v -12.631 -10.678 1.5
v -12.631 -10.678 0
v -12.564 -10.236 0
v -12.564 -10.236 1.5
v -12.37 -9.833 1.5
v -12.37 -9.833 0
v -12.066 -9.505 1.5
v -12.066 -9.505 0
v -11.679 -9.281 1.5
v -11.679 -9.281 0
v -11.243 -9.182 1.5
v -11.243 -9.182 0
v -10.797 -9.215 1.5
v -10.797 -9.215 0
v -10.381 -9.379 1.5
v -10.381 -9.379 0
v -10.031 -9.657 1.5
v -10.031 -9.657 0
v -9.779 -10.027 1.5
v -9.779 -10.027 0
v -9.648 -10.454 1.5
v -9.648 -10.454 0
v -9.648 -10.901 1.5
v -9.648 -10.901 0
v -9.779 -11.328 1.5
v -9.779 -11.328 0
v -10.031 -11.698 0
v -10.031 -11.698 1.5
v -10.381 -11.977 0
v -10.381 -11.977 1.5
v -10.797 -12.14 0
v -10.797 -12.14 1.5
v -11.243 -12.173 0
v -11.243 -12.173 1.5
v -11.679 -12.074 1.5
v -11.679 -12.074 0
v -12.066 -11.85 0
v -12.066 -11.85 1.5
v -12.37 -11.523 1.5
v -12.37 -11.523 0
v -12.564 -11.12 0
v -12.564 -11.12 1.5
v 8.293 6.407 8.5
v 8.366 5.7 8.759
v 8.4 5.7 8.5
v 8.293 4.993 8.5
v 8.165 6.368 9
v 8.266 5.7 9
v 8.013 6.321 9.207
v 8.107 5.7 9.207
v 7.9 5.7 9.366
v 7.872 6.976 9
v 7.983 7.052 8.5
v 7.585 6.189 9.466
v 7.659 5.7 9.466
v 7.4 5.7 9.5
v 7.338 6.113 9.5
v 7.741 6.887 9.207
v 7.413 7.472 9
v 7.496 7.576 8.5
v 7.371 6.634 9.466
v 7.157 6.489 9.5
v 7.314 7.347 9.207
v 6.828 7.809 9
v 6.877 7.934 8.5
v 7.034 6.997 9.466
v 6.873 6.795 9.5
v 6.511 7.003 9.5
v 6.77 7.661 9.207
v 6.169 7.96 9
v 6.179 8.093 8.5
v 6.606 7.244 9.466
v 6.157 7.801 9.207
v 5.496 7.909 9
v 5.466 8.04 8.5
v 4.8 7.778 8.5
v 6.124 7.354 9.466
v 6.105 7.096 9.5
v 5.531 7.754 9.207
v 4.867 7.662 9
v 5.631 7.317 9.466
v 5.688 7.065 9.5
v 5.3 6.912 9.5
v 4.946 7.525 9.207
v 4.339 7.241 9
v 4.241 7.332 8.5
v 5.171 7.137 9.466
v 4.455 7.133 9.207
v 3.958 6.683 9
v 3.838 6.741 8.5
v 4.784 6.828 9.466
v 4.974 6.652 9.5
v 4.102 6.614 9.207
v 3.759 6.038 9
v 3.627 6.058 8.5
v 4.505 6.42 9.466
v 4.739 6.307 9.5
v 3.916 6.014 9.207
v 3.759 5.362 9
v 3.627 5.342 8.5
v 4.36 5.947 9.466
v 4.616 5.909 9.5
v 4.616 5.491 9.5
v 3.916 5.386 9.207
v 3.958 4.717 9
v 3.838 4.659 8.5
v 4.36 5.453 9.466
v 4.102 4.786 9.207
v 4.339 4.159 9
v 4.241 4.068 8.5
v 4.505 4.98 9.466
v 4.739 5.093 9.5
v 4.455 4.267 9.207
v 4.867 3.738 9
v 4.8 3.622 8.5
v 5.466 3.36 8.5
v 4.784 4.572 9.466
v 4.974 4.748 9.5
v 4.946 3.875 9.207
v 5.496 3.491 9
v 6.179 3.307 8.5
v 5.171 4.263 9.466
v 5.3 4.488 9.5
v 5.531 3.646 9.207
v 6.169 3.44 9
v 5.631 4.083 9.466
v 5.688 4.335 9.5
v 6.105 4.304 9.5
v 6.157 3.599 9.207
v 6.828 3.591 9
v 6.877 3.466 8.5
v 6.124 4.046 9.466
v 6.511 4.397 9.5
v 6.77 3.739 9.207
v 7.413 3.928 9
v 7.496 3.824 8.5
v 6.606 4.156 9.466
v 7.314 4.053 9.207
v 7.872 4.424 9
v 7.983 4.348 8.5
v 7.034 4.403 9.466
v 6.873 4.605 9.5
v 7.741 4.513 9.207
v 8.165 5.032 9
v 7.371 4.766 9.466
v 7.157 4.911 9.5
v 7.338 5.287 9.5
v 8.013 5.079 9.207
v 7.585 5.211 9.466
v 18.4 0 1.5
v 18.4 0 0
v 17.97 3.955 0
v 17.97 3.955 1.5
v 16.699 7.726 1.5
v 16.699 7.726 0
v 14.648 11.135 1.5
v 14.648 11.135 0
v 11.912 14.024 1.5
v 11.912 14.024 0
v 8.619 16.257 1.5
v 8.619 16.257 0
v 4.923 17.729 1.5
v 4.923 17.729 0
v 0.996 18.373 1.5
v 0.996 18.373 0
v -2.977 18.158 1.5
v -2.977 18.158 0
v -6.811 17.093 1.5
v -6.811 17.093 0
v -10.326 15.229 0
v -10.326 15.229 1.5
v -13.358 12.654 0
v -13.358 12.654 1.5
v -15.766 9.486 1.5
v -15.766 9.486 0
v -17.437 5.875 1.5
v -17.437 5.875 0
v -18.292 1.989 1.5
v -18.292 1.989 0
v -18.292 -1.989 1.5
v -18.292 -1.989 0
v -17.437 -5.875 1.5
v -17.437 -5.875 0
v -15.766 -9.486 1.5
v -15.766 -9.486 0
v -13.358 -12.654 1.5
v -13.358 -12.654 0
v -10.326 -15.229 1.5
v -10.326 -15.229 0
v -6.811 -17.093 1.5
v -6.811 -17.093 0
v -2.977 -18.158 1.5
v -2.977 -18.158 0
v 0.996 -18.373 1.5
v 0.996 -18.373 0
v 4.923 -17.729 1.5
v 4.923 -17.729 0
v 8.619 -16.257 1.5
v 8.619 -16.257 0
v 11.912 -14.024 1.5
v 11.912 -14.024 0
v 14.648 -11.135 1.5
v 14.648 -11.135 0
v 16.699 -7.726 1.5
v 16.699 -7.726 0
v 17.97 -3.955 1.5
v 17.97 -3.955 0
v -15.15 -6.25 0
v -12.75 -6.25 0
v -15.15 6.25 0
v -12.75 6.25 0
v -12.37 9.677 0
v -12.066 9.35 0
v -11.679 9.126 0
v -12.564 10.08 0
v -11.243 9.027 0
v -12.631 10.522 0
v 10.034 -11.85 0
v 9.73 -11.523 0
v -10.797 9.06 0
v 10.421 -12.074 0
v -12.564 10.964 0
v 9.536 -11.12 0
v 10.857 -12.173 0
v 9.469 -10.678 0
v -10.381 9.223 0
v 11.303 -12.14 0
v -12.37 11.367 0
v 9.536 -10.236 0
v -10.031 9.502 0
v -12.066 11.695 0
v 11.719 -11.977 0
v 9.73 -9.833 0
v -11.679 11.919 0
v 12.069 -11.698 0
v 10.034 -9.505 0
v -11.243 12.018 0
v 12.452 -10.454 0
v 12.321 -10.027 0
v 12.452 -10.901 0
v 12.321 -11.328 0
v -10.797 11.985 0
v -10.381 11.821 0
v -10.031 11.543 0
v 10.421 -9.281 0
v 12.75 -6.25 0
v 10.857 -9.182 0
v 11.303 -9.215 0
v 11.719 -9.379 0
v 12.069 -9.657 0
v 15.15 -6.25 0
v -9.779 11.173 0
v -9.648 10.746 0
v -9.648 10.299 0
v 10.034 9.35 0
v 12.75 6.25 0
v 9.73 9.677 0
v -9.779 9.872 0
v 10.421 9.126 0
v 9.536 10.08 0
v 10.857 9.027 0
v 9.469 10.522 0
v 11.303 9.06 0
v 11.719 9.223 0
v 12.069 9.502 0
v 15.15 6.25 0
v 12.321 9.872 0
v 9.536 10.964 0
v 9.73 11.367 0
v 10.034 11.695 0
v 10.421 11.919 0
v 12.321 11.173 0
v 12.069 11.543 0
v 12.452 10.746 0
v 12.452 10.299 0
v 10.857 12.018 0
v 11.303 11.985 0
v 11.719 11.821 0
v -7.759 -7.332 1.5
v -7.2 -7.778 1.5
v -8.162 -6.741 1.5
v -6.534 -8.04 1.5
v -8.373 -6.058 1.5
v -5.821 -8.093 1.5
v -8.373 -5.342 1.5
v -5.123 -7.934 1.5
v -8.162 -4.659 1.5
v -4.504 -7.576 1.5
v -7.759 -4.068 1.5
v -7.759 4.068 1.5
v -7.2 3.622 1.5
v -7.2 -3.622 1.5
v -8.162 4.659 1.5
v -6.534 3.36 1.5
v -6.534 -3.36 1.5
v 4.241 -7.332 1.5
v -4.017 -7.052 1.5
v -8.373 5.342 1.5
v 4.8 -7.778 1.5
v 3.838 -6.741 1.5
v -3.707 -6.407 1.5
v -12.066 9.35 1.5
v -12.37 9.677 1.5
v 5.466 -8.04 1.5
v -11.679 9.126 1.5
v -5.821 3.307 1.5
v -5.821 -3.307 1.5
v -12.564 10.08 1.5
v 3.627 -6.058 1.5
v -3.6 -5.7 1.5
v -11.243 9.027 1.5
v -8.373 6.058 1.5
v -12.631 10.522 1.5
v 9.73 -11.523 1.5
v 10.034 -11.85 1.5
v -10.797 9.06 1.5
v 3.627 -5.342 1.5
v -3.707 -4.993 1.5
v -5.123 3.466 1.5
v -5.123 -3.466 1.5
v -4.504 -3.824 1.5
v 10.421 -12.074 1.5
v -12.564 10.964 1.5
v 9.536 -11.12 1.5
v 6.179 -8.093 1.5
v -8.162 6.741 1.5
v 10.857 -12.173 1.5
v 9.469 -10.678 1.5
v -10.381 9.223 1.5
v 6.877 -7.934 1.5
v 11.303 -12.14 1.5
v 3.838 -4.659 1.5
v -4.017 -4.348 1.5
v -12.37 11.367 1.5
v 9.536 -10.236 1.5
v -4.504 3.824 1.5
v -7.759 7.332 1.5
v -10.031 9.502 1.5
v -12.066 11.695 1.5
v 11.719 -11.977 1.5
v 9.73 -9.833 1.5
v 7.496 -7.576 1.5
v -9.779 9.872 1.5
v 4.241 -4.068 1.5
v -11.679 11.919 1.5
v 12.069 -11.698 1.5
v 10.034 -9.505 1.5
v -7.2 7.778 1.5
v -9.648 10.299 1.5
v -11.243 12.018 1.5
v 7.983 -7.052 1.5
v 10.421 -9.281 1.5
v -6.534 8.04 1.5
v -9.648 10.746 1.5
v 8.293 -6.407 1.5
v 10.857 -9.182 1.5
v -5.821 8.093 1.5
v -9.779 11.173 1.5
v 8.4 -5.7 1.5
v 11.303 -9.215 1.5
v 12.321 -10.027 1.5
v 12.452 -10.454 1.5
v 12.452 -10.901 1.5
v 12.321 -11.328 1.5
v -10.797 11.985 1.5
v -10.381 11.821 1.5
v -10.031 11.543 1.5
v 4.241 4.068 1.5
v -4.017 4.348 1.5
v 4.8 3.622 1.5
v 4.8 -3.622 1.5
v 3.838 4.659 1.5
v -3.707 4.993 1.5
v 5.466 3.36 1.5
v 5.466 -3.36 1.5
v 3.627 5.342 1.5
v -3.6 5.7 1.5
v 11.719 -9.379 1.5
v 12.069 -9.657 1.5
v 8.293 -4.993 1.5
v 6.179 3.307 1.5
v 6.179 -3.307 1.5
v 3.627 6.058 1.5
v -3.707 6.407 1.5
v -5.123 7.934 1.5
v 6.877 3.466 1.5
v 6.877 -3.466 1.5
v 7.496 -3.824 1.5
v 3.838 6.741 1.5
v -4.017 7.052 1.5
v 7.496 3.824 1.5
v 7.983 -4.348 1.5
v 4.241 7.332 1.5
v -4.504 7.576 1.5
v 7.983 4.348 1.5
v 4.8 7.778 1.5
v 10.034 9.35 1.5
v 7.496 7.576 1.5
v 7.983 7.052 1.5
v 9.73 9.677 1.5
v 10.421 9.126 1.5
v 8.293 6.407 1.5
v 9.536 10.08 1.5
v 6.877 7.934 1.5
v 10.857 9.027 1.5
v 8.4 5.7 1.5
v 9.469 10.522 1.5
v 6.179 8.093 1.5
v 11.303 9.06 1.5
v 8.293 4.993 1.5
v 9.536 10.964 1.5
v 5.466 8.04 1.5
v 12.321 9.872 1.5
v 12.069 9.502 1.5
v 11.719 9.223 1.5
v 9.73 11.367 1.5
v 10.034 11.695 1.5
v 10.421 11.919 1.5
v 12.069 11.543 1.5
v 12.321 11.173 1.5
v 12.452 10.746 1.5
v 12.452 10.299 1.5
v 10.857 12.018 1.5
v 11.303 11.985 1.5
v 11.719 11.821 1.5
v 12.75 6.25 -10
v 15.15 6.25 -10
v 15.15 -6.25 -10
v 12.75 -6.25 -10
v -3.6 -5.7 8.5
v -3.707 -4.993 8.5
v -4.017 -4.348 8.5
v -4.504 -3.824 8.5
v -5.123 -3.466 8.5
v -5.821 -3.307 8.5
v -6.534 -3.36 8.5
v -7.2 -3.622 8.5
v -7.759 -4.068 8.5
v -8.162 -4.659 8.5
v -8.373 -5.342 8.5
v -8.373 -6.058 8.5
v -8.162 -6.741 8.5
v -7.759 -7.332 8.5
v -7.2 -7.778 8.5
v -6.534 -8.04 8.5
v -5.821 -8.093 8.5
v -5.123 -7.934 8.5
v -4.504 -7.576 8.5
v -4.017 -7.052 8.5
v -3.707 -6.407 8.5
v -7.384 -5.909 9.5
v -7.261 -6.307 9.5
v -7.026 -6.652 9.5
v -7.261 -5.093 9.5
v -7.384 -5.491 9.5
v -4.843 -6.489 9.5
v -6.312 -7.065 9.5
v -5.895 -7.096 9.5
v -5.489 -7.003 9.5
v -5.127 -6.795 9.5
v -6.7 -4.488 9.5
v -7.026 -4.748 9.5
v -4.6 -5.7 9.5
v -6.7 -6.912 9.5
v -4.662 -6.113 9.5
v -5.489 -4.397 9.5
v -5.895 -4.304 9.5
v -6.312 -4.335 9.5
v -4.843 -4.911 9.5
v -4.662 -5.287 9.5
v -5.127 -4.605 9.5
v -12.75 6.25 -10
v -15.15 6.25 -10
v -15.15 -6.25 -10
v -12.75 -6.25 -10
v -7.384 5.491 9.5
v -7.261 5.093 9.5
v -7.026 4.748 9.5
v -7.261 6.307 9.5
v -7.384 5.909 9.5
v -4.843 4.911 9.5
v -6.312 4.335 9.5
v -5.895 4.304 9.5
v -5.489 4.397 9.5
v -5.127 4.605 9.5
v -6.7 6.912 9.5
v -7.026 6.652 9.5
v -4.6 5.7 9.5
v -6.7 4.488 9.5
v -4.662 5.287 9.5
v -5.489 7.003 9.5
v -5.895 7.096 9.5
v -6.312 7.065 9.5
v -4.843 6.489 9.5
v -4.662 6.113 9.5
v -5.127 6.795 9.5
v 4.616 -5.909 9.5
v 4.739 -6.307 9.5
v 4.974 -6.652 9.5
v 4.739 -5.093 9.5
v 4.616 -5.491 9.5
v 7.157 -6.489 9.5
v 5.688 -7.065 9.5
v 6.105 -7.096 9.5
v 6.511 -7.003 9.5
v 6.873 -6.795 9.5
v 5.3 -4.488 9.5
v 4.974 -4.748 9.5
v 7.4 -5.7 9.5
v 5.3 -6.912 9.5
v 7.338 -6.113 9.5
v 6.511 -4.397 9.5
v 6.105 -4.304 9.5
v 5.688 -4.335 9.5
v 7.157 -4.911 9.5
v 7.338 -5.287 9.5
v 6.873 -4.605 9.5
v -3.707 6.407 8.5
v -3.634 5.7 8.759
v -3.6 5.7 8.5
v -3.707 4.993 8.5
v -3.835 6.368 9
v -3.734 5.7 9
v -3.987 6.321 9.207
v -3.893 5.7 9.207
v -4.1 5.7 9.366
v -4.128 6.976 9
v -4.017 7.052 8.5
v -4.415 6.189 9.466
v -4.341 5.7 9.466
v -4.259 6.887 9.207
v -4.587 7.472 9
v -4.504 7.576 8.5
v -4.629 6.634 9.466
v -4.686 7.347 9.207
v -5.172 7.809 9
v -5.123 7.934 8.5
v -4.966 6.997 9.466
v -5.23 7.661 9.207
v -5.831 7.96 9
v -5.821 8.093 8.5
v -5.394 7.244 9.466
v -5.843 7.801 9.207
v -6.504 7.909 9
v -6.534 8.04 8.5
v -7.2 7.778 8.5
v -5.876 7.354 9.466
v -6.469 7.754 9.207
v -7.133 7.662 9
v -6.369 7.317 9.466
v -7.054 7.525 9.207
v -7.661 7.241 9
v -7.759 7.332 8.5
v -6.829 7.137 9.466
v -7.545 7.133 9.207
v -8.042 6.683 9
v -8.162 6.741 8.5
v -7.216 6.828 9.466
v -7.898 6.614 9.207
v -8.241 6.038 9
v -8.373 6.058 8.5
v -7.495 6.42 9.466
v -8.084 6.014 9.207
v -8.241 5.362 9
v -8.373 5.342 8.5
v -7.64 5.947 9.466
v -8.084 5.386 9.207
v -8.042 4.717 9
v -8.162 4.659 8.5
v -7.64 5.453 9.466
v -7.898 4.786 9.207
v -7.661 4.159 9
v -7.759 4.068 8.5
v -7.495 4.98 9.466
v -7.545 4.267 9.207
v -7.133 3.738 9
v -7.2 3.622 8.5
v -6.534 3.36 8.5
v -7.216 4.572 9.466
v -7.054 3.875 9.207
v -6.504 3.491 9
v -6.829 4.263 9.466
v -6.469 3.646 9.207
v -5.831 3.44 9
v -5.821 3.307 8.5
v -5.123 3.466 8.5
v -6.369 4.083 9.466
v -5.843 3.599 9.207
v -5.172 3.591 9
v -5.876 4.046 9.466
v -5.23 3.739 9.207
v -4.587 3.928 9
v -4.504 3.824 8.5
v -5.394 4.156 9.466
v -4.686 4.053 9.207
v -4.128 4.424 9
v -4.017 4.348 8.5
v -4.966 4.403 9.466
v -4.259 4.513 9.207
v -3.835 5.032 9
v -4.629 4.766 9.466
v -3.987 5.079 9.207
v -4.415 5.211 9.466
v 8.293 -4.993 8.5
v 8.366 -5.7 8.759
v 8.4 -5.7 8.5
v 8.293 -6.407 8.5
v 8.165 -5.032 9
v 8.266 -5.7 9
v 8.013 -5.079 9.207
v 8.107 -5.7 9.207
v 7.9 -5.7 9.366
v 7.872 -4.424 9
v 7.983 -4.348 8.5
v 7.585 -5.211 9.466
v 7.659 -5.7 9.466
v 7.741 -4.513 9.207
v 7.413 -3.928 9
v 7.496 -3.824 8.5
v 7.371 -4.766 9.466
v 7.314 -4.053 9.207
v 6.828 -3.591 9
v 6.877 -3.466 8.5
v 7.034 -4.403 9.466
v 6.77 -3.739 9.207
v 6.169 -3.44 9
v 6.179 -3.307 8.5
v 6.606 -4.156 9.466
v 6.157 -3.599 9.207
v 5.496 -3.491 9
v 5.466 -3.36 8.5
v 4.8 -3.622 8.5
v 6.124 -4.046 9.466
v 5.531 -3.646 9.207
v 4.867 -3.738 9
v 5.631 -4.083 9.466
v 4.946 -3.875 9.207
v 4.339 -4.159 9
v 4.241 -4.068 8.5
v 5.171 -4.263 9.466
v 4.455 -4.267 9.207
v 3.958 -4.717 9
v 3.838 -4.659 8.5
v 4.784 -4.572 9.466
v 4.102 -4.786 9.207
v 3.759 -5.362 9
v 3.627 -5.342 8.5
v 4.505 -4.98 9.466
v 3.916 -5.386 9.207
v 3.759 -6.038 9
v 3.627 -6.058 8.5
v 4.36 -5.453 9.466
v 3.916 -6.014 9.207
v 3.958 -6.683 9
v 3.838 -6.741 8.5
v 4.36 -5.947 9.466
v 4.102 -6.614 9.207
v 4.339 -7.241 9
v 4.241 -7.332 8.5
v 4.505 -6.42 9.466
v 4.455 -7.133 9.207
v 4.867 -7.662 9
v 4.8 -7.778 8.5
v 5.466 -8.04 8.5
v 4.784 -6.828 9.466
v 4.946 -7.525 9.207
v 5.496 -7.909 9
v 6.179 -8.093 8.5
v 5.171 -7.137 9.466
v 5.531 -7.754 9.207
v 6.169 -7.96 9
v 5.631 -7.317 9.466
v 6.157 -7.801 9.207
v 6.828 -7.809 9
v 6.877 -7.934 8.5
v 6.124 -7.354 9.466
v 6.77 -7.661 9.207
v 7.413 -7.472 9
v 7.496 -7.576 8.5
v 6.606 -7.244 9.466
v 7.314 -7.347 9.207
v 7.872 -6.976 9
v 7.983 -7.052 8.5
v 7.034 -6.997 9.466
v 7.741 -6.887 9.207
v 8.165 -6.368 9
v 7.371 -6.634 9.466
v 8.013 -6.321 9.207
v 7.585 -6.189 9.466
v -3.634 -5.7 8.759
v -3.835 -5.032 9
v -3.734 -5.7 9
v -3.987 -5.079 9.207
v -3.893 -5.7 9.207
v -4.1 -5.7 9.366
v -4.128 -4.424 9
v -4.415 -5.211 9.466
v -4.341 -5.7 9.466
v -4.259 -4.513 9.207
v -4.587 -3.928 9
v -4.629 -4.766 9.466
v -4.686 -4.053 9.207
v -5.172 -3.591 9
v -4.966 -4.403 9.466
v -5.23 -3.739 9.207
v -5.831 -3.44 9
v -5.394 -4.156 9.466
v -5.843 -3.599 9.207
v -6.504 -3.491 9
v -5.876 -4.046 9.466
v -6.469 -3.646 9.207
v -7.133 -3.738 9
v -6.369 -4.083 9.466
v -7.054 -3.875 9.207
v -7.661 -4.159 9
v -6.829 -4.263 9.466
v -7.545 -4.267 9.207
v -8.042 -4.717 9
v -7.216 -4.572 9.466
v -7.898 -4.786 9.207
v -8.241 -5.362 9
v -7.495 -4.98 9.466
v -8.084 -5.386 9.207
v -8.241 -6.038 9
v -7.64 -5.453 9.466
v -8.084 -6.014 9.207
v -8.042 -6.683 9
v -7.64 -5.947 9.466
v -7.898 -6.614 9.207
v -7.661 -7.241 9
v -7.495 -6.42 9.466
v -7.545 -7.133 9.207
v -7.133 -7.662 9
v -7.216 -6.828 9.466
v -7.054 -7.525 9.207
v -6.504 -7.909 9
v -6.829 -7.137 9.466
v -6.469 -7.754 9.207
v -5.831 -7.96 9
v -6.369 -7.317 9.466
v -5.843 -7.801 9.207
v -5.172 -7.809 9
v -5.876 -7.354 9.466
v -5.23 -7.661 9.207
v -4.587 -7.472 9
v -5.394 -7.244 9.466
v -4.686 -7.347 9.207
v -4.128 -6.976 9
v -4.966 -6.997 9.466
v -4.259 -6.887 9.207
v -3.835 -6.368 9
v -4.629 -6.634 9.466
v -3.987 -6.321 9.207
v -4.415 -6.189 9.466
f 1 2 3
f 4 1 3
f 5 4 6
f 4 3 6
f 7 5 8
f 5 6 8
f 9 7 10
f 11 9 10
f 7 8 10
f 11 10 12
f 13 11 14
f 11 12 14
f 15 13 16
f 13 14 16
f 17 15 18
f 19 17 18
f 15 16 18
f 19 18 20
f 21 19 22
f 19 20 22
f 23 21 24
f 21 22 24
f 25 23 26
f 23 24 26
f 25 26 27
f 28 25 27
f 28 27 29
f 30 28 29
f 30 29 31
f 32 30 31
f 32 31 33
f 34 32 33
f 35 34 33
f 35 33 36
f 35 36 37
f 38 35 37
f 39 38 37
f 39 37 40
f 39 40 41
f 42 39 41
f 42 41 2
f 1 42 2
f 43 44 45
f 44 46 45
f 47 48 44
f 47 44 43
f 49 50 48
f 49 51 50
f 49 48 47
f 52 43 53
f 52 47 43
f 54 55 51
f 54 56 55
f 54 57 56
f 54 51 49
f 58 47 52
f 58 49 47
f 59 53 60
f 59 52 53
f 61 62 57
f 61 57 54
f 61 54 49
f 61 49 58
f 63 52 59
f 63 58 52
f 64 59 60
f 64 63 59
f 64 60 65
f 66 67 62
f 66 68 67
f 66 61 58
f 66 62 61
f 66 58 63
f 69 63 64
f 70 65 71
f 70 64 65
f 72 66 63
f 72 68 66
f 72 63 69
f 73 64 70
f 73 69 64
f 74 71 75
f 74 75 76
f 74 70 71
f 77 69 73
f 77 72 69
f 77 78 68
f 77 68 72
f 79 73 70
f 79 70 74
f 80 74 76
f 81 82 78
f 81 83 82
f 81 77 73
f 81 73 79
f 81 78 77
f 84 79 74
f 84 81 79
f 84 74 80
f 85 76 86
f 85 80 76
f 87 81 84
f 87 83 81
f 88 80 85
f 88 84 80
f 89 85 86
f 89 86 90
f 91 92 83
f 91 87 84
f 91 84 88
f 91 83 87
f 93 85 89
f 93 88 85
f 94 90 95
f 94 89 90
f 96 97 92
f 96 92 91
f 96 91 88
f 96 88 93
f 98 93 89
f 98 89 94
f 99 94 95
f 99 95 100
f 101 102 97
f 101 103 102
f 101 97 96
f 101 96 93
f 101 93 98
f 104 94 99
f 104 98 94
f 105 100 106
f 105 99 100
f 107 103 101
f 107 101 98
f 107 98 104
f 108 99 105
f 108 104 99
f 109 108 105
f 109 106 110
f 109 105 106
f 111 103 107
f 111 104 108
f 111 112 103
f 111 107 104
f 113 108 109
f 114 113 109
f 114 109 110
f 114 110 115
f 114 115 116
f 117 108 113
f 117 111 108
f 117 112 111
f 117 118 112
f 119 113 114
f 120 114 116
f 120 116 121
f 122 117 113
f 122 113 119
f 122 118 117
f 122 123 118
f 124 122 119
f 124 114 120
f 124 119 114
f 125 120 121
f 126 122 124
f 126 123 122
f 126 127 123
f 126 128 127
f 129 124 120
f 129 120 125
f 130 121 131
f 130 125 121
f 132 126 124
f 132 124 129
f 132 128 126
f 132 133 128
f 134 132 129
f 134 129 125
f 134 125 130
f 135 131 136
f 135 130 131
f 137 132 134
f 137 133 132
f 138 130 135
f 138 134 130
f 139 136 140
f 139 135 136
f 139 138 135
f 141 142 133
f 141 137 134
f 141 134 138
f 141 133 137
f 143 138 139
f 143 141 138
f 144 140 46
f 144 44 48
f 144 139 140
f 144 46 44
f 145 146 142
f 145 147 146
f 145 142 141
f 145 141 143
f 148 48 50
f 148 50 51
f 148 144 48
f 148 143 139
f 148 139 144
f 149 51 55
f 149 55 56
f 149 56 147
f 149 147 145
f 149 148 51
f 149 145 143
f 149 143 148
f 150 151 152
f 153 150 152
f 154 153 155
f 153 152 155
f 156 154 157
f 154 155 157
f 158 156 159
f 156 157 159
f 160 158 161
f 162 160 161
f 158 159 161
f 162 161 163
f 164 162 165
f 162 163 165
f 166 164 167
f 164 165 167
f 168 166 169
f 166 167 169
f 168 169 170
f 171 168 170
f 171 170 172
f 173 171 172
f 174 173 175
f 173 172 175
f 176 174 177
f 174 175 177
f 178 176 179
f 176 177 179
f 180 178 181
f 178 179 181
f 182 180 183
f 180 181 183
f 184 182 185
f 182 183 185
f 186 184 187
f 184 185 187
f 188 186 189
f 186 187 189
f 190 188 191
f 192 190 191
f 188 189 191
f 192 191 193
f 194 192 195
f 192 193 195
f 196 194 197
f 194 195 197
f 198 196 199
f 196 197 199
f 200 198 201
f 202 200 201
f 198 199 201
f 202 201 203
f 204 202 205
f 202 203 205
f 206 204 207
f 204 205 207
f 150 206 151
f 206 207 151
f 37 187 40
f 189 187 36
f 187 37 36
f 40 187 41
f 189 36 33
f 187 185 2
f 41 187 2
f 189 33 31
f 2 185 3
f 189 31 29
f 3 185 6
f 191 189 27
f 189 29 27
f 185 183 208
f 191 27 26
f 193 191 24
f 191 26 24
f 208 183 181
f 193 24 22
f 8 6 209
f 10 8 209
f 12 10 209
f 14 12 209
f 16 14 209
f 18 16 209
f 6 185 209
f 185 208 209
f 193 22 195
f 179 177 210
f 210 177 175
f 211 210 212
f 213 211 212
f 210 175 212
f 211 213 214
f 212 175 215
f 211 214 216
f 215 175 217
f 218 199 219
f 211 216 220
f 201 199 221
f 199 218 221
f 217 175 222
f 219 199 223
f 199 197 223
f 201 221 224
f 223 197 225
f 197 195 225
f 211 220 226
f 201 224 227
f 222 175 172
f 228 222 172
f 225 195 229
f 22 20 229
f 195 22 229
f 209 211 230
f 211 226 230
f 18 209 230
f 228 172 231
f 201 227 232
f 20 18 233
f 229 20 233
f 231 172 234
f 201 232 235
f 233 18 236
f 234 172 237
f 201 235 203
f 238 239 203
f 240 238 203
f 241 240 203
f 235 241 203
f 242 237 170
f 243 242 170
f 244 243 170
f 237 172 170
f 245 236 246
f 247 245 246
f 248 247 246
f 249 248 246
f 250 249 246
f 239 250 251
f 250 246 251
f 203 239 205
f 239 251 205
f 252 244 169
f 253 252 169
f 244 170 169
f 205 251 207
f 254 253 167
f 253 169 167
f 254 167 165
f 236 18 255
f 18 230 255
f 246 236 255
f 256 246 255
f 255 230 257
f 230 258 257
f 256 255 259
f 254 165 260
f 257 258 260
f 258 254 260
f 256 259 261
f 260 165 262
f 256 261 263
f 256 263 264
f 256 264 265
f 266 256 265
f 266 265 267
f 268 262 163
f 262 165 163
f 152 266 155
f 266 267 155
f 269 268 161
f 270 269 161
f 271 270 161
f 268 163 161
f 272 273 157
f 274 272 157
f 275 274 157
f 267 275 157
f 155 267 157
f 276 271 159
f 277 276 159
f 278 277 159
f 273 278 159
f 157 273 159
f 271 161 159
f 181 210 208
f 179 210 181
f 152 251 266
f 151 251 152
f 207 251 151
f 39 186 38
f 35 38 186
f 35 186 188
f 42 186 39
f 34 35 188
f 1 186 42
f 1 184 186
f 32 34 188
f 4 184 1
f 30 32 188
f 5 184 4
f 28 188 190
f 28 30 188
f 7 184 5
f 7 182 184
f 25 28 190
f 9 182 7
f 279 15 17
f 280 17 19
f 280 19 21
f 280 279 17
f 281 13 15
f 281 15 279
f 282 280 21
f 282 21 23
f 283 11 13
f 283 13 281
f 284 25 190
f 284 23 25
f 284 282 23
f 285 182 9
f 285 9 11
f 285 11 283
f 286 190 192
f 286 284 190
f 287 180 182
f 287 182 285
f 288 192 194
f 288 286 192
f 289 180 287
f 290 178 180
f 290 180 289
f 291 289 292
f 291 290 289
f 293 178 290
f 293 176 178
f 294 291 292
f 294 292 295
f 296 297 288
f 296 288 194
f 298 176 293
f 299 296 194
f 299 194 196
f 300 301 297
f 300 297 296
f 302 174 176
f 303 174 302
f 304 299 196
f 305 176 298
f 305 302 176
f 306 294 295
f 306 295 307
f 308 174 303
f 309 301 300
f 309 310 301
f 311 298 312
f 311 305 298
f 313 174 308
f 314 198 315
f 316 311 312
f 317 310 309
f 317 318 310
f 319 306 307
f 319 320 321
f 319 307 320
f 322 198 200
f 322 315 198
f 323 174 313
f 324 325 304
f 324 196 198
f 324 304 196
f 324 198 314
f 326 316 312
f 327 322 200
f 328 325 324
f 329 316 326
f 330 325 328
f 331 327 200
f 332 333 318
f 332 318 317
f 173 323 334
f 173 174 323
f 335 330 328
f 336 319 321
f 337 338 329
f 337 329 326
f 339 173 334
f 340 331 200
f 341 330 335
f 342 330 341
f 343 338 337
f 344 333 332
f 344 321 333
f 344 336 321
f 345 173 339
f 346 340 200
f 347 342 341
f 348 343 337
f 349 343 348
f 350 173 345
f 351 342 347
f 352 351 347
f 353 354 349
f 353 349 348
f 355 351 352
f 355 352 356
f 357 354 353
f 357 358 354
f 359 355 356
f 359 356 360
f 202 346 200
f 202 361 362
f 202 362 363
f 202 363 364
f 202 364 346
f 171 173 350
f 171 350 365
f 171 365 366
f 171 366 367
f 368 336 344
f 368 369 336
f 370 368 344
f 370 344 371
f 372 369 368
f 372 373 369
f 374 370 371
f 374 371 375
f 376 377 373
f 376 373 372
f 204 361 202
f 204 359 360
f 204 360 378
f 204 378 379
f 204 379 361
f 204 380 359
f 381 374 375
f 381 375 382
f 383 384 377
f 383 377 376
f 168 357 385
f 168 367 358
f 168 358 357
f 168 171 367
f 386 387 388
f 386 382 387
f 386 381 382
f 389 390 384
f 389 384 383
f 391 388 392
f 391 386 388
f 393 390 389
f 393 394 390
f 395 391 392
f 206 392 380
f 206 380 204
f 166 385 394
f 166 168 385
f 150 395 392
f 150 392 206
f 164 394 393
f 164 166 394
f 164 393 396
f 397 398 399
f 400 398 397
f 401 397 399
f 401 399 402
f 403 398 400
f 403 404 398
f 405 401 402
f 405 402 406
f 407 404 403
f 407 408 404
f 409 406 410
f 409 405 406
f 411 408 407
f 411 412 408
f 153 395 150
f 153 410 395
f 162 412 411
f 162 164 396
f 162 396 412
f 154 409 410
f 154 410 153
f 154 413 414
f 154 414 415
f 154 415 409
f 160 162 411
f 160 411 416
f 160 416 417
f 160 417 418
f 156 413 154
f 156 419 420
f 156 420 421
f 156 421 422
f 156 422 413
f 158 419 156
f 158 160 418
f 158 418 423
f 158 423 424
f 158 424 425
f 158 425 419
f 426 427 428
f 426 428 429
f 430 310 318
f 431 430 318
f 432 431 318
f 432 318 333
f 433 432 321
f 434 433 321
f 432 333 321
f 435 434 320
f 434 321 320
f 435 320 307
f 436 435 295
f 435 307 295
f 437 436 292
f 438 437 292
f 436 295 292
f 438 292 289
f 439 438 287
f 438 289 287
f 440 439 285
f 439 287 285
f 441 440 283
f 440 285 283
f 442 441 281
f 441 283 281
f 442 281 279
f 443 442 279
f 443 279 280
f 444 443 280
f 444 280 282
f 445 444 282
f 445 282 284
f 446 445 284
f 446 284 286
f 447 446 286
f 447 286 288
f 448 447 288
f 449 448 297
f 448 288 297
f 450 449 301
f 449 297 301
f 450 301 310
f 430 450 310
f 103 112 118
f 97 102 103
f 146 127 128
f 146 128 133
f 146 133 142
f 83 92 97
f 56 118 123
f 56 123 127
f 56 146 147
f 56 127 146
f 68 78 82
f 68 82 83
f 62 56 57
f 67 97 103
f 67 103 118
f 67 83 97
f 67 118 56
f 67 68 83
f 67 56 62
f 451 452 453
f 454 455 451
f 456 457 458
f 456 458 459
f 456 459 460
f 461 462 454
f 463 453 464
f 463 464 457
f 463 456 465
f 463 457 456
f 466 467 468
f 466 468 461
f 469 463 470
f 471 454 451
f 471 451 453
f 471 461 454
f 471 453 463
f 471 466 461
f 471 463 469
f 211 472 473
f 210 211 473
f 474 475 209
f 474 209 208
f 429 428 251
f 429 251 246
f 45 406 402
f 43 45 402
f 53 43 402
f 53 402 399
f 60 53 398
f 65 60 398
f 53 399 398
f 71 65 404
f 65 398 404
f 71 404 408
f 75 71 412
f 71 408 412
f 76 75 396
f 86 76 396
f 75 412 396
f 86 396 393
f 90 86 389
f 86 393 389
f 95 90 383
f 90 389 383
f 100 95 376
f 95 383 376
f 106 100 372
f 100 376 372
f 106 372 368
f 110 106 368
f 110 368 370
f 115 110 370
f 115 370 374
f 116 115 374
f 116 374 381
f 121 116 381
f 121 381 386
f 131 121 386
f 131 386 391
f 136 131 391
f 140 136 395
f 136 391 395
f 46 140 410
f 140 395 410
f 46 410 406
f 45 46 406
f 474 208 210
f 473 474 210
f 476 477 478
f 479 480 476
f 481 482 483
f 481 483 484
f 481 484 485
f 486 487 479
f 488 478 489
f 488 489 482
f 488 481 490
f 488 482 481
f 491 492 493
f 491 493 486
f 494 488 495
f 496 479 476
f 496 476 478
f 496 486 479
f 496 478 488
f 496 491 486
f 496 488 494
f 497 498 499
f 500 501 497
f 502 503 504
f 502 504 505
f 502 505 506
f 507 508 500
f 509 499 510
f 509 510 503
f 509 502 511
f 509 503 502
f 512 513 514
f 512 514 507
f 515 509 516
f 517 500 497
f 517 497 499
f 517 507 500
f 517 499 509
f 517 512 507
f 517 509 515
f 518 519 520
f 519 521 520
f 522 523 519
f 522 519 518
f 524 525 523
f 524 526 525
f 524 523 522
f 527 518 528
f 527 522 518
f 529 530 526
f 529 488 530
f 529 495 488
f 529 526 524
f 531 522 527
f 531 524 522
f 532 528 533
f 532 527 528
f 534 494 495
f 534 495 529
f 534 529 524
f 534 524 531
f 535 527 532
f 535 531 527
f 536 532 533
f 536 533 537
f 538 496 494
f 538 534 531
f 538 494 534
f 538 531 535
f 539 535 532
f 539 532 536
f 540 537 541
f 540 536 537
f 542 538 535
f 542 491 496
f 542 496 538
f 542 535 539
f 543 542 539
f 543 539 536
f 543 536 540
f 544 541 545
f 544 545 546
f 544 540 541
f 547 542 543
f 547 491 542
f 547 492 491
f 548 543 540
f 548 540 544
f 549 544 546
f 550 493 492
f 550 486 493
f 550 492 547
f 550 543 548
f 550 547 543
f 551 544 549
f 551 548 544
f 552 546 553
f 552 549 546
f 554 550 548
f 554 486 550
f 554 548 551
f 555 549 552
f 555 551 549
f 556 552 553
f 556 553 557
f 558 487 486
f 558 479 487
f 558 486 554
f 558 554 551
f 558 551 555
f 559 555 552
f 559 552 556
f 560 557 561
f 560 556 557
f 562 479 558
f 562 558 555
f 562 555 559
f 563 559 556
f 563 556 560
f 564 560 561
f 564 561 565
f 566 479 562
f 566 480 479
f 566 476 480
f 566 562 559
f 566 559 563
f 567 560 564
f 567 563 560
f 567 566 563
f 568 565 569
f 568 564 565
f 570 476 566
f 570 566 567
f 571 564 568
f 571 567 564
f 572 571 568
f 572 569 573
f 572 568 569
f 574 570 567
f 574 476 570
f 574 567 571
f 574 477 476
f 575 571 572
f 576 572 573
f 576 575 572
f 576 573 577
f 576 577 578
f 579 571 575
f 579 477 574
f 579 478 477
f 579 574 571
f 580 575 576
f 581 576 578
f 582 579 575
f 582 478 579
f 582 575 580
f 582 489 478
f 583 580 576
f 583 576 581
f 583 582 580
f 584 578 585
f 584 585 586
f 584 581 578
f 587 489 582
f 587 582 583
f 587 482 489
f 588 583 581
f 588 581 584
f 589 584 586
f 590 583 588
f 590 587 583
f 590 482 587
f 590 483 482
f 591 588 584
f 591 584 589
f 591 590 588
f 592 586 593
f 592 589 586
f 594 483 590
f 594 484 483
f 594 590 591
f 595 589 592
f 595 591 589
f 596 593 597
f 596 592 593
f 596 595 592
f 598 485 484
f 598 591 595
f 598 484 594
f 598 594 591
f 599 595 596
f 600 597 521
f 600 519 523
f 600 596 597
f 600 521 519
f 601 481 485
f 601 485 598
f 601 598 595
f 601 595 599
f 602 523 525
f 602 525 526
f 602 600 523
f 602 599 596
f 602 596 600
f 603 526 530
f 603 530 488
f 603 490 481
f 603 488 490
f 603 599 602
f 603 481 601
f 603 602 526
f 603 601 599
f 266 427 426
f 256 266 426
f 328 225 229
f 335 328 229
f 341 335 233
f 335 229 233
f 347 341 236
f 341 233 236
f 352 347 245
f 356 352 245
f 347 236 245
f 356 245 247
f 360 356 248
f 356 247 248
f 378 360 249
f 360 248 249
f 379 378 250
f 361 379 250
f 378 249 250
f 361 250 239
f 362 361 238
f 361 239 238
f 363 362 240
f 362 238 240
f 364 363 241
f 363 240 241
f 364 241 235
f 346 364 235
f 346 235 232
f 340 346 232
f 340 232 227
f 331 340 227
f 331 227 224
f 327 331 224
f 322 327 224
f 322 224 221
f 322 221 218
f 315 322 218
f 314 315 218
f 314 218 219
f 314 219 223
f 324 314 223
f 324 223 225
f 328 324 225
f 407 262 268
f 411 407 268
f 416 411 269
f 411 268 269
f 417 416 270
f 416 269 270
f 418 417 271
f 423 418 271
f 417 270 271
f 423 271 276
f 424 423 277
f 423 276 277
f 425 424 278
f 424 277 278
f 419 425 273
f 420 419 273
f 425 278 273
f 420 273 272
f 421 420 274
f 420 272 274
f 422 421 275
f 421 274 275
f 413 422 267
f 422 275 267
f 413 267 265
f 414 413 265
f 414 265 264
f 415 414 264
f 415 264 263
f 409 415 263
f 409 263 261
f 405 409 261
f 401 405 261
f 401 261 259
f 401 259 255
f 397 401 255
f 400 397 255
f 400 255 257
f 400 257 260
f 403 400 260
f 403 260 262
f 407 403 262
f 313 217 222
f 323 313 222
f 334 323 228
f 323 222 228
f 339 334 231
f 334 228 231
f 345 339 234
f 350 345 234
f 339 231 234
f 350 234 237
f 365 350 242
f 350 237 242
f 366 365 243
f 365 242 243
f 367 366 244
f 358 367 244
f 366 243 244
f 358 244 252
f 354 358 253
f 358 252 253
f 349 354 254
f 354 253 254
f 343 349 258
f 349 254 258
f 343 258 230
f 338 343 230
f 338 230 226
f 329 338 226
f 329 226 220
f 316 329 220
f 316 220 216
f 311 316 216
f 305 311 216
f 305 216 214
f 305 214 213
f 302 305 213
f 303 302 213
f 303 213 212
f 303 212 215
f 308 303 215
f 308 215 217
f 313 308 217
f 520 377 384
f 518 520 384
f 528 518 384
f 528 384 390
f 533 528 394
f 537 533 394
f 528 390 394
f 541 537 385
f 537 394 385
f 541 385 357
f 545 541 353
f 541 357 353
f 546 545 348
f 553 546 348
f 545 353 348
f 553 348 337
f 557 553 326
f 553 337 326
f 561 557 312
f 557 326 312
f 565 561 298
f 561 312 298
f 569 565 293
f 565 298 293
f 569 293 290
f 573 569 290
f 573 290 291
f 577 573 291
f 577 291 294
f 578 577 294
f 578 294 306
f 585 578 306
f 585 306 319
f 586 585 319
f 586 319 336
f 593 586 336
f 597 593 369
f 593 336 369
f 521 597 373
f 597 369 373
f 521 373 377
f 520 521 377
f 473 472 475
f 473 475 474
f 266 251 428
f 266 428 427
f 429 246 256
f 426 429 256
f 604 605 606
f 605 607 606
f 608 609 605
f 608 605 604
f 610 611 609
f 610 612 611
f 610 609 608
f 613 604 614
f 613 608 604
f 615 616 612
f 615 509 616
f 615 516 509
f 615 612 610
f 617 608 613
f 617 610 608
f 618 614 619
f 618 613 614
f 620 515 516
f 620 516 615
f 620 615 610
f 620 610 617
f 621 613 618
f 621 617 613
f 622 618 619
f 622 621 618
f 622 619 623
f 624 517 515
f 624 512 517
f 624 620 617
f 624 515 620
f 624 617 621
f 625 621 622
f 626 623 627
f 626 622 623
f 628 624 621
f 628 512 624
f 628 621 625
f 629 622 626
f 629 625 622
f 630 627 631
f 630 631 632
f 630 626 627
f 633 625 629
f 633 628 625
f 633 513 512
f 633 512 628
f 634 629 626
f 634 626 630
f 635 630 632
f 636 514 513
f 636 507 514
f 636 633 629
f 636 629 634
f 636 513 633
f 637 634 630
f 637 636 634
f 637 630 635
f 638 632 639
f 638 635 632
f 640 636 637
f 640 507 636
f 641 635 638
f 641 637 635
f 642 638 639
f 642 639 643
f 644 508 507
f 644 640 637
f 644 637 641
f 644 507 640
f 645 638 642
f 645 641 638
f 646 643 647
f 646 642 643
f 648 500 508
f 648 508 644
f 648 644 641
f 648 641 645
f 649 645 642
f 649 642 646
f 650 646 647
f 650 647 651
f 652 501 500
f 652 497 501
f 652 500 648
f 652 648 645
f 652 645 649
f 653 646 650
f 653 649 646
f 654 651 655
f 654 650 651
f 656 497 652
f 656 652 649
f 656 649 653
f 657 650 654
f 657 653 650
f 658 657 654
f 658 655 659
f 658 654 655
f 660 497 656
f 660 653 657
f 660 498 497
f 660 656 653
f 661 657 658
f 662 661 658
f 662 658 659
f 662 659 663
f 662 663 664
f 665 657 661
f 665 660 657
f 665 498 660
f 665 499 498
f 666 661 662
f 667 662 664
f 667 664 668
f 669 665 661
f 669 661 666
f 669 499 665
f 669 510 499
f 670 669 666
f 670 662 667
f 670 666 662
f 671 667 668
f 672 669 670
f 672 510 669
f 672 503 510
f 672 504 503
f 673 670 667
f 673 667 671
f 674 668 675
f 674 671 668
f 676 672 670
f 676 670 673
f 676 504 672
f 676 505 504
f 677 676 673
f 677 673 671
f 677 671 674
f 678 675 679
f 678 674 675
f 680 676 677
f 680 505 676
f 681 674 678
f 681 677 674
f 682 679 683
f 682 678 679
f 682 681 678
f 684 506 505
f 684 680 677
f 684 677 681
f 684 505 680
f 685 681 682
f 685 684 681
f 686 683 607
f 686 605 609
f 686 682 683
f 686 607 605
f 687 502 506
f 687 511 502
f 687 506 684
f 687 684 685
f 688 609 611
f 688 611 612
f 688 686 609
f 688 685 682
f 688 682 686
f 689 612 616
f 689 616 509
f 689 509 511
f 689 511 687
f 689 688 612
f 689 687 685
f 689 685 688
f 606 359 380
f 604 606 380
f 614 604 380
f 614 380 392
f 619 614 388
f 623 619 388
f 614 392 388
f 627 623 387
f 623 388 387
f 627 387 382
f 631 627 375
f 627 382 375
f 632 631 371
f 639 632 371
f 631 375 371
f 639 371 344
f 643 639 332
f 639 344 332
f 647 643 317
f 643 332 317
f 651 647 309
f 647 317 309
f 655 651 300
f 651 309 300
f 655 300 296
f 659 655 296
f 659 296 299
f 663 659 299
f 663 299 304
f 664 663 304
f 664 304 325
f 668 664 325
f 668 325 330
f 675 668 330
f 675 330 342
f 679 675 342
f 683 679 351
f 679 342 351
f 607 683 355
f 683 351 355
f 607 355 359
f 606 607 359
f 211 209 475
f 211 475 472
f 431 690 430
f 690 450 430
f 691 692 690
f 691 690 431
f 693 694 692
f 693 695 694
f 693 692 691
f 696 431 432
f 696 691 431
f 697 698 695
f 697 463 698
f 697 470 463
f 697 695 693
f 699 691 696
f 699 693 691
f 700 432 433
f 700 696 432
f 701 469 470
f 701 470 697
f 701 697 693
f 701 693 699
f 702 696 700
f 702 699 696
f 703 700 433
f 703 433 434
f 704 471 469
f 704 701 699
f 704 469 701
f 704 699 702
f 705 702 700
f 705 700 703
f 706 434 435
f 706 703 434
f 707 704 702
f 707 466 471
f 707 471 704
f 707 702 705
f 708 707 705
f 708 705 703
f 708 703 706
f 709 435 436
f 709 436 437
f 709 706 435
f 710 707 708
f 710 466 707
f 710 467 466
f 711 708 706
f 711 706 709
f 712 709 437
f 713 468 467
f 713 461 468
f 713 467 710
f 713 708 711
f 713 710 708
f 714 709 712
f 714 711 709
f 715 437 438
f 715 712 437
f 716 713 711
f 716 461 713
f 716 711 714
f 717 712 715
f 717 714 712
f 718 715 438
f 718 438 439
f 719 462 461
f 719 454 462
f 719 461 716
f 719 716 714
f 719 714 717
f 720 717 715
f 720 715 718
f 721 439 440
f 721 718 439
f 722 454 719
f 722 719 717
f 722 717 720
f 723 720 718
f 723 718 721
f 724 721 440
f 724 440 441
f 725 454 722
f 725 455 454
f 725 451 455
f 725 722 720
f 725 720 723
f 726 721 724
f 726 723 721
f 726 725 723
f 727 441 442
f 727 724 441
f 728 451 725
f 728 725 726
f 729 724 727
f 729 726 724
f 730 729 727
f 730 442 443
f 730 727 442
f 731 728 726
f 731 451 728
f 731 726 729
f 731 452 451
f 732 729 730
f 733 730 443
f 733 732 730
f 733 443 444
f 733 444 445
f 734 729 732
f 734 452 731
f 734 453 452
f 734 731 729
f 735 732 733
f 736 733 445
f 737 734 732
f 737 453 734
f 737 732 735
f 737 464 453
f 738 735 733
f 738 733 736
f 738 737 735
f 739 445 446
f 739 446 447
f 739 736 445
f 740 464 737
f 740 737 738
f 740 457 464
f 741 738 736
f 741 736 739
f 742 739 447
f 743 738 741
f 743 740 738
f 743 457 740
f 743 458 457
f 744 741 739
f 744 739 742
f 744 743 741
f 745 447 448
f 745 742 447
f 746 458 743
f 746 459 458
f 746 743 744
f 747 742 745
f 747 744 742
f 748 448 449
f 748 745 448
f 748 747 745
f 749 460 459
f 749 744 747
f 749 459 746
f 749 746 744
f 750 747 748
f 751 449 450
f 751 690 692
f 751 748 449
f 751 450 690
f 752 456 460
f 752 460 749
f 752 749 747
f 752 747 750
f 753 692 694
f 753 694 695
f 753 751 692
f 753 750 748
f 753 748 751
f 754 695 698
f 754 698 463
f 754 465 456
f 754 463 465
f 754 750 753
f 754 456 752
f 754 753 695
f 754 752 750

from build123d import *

# Parameters (mm, degrees)
ESQUISSE1_R             = 18.4
BOSS_EXTRU_1_DEPTH      = 1.5
ESQUISSE3_R             = 1.5
ENL_V_MAT_EXTRU_1_DEPTH = 10
ESQUISSE4_W             = 2.4
ESQUISSE4_H             = 12.5
BOSS_EXTRU_2_DEPTH      = 10
ESQUISSE5_R             = 2.4
BOSS_EXTRU_3_DEPTH      = 8
CONG_1_R                = 1


with BuildPart() as part:
    # Esquisse1 → Boss.-Extru.1 (new body)
    with BuildSketch(Plane.XY):
        Circle(ESQUISSE1_R)
    extrude(amount=BOSS_EXTRU_1_DEPTH)

    # Esquisse3 → Enlèv. mat.-Extru.1 (cut)
    with BuildSketch(Plane(origin=(0, 0, 0), x_dir=(-1, 0, 0), z_dir=(0, 0, -1))):
        with Locations((28.033142688, 46.078269557)):
            Circle(ESQUISSE3_R)
        with Locations((28.033142688, 24.878269557)):
            Circle(ESQUISSE3_R)
        with Locations((5.933142688, 24.878269557)):
            Circle(ESQUISSE3_R)
        with Locations((5.933142688, 46.078269557)):
            Circle(ESQUISSE3_R)
        with Locations((11.130946107, 10.522350341)):
            Circle(ESQUISSE3_R)
        with Locations((11.130946107, -10.677649659)):
            Circle(ESQUISSE3_R)
        with Locations((-10.969053893, -10.677649659)):
            Circle(ESQUISSE3_R)
        with Locations((-10.969053893, 10.522350341)):
            Circle(ESQUISSE3_R)
    extrude(amount=-ENL_V_MAT_EXTRU_1_DEPTH, mode=Mode.SUBTRACT)

    # Esquisse4 → Boss.-Extru.2 (add)
    with BuildSketch(Plane(origin=(0, 0, 0), x_dir=(-1, 0, 0), z_dir=(0, 0, -1))):
        with Locations((13.95, 0)):
            Rectangle(ESQUISSE4_W, ESQUISSE4_H)
        with Locations((-13.95, 0)):
            Rectangle(ESQUISSE4_W, ESQUISSE4_H)
    extrude(amount=BOSS_EXTRU_2_DEPTH)

    # Esquisse5 → Boss.-Extru.3 (add)
    with BuildSketch(Plane.XY.offset(1.5)):
        with Locations((6, 5.7)):
            Circle(ESQUISSE5_R)
        with Locations((6, -5.7)):
            Circle(ESQUISSE5_R)
        with Locations((-6, -5.7)):
            Circle(ESQUISSE5_R)
        with Locations((-6, 5.7)):
            Circle(ESQUISSE5_R)
    extrude(amount=BOSS_EXTRU_3_DEPTH)

    # Congé1
    cong_1_edges = [part.edges().sort_by_distance(p)[0] for p in [
        (3.6, 5.7, 9.5),
        (3.6, -5.7, 9.5),
        (-8.4, -5.7, 9.5),
        (-8.4, 5.7, 9.5),
    ]]
    fillet(cong_1_edges, radius=CONG_1_R)


solid = part.part
